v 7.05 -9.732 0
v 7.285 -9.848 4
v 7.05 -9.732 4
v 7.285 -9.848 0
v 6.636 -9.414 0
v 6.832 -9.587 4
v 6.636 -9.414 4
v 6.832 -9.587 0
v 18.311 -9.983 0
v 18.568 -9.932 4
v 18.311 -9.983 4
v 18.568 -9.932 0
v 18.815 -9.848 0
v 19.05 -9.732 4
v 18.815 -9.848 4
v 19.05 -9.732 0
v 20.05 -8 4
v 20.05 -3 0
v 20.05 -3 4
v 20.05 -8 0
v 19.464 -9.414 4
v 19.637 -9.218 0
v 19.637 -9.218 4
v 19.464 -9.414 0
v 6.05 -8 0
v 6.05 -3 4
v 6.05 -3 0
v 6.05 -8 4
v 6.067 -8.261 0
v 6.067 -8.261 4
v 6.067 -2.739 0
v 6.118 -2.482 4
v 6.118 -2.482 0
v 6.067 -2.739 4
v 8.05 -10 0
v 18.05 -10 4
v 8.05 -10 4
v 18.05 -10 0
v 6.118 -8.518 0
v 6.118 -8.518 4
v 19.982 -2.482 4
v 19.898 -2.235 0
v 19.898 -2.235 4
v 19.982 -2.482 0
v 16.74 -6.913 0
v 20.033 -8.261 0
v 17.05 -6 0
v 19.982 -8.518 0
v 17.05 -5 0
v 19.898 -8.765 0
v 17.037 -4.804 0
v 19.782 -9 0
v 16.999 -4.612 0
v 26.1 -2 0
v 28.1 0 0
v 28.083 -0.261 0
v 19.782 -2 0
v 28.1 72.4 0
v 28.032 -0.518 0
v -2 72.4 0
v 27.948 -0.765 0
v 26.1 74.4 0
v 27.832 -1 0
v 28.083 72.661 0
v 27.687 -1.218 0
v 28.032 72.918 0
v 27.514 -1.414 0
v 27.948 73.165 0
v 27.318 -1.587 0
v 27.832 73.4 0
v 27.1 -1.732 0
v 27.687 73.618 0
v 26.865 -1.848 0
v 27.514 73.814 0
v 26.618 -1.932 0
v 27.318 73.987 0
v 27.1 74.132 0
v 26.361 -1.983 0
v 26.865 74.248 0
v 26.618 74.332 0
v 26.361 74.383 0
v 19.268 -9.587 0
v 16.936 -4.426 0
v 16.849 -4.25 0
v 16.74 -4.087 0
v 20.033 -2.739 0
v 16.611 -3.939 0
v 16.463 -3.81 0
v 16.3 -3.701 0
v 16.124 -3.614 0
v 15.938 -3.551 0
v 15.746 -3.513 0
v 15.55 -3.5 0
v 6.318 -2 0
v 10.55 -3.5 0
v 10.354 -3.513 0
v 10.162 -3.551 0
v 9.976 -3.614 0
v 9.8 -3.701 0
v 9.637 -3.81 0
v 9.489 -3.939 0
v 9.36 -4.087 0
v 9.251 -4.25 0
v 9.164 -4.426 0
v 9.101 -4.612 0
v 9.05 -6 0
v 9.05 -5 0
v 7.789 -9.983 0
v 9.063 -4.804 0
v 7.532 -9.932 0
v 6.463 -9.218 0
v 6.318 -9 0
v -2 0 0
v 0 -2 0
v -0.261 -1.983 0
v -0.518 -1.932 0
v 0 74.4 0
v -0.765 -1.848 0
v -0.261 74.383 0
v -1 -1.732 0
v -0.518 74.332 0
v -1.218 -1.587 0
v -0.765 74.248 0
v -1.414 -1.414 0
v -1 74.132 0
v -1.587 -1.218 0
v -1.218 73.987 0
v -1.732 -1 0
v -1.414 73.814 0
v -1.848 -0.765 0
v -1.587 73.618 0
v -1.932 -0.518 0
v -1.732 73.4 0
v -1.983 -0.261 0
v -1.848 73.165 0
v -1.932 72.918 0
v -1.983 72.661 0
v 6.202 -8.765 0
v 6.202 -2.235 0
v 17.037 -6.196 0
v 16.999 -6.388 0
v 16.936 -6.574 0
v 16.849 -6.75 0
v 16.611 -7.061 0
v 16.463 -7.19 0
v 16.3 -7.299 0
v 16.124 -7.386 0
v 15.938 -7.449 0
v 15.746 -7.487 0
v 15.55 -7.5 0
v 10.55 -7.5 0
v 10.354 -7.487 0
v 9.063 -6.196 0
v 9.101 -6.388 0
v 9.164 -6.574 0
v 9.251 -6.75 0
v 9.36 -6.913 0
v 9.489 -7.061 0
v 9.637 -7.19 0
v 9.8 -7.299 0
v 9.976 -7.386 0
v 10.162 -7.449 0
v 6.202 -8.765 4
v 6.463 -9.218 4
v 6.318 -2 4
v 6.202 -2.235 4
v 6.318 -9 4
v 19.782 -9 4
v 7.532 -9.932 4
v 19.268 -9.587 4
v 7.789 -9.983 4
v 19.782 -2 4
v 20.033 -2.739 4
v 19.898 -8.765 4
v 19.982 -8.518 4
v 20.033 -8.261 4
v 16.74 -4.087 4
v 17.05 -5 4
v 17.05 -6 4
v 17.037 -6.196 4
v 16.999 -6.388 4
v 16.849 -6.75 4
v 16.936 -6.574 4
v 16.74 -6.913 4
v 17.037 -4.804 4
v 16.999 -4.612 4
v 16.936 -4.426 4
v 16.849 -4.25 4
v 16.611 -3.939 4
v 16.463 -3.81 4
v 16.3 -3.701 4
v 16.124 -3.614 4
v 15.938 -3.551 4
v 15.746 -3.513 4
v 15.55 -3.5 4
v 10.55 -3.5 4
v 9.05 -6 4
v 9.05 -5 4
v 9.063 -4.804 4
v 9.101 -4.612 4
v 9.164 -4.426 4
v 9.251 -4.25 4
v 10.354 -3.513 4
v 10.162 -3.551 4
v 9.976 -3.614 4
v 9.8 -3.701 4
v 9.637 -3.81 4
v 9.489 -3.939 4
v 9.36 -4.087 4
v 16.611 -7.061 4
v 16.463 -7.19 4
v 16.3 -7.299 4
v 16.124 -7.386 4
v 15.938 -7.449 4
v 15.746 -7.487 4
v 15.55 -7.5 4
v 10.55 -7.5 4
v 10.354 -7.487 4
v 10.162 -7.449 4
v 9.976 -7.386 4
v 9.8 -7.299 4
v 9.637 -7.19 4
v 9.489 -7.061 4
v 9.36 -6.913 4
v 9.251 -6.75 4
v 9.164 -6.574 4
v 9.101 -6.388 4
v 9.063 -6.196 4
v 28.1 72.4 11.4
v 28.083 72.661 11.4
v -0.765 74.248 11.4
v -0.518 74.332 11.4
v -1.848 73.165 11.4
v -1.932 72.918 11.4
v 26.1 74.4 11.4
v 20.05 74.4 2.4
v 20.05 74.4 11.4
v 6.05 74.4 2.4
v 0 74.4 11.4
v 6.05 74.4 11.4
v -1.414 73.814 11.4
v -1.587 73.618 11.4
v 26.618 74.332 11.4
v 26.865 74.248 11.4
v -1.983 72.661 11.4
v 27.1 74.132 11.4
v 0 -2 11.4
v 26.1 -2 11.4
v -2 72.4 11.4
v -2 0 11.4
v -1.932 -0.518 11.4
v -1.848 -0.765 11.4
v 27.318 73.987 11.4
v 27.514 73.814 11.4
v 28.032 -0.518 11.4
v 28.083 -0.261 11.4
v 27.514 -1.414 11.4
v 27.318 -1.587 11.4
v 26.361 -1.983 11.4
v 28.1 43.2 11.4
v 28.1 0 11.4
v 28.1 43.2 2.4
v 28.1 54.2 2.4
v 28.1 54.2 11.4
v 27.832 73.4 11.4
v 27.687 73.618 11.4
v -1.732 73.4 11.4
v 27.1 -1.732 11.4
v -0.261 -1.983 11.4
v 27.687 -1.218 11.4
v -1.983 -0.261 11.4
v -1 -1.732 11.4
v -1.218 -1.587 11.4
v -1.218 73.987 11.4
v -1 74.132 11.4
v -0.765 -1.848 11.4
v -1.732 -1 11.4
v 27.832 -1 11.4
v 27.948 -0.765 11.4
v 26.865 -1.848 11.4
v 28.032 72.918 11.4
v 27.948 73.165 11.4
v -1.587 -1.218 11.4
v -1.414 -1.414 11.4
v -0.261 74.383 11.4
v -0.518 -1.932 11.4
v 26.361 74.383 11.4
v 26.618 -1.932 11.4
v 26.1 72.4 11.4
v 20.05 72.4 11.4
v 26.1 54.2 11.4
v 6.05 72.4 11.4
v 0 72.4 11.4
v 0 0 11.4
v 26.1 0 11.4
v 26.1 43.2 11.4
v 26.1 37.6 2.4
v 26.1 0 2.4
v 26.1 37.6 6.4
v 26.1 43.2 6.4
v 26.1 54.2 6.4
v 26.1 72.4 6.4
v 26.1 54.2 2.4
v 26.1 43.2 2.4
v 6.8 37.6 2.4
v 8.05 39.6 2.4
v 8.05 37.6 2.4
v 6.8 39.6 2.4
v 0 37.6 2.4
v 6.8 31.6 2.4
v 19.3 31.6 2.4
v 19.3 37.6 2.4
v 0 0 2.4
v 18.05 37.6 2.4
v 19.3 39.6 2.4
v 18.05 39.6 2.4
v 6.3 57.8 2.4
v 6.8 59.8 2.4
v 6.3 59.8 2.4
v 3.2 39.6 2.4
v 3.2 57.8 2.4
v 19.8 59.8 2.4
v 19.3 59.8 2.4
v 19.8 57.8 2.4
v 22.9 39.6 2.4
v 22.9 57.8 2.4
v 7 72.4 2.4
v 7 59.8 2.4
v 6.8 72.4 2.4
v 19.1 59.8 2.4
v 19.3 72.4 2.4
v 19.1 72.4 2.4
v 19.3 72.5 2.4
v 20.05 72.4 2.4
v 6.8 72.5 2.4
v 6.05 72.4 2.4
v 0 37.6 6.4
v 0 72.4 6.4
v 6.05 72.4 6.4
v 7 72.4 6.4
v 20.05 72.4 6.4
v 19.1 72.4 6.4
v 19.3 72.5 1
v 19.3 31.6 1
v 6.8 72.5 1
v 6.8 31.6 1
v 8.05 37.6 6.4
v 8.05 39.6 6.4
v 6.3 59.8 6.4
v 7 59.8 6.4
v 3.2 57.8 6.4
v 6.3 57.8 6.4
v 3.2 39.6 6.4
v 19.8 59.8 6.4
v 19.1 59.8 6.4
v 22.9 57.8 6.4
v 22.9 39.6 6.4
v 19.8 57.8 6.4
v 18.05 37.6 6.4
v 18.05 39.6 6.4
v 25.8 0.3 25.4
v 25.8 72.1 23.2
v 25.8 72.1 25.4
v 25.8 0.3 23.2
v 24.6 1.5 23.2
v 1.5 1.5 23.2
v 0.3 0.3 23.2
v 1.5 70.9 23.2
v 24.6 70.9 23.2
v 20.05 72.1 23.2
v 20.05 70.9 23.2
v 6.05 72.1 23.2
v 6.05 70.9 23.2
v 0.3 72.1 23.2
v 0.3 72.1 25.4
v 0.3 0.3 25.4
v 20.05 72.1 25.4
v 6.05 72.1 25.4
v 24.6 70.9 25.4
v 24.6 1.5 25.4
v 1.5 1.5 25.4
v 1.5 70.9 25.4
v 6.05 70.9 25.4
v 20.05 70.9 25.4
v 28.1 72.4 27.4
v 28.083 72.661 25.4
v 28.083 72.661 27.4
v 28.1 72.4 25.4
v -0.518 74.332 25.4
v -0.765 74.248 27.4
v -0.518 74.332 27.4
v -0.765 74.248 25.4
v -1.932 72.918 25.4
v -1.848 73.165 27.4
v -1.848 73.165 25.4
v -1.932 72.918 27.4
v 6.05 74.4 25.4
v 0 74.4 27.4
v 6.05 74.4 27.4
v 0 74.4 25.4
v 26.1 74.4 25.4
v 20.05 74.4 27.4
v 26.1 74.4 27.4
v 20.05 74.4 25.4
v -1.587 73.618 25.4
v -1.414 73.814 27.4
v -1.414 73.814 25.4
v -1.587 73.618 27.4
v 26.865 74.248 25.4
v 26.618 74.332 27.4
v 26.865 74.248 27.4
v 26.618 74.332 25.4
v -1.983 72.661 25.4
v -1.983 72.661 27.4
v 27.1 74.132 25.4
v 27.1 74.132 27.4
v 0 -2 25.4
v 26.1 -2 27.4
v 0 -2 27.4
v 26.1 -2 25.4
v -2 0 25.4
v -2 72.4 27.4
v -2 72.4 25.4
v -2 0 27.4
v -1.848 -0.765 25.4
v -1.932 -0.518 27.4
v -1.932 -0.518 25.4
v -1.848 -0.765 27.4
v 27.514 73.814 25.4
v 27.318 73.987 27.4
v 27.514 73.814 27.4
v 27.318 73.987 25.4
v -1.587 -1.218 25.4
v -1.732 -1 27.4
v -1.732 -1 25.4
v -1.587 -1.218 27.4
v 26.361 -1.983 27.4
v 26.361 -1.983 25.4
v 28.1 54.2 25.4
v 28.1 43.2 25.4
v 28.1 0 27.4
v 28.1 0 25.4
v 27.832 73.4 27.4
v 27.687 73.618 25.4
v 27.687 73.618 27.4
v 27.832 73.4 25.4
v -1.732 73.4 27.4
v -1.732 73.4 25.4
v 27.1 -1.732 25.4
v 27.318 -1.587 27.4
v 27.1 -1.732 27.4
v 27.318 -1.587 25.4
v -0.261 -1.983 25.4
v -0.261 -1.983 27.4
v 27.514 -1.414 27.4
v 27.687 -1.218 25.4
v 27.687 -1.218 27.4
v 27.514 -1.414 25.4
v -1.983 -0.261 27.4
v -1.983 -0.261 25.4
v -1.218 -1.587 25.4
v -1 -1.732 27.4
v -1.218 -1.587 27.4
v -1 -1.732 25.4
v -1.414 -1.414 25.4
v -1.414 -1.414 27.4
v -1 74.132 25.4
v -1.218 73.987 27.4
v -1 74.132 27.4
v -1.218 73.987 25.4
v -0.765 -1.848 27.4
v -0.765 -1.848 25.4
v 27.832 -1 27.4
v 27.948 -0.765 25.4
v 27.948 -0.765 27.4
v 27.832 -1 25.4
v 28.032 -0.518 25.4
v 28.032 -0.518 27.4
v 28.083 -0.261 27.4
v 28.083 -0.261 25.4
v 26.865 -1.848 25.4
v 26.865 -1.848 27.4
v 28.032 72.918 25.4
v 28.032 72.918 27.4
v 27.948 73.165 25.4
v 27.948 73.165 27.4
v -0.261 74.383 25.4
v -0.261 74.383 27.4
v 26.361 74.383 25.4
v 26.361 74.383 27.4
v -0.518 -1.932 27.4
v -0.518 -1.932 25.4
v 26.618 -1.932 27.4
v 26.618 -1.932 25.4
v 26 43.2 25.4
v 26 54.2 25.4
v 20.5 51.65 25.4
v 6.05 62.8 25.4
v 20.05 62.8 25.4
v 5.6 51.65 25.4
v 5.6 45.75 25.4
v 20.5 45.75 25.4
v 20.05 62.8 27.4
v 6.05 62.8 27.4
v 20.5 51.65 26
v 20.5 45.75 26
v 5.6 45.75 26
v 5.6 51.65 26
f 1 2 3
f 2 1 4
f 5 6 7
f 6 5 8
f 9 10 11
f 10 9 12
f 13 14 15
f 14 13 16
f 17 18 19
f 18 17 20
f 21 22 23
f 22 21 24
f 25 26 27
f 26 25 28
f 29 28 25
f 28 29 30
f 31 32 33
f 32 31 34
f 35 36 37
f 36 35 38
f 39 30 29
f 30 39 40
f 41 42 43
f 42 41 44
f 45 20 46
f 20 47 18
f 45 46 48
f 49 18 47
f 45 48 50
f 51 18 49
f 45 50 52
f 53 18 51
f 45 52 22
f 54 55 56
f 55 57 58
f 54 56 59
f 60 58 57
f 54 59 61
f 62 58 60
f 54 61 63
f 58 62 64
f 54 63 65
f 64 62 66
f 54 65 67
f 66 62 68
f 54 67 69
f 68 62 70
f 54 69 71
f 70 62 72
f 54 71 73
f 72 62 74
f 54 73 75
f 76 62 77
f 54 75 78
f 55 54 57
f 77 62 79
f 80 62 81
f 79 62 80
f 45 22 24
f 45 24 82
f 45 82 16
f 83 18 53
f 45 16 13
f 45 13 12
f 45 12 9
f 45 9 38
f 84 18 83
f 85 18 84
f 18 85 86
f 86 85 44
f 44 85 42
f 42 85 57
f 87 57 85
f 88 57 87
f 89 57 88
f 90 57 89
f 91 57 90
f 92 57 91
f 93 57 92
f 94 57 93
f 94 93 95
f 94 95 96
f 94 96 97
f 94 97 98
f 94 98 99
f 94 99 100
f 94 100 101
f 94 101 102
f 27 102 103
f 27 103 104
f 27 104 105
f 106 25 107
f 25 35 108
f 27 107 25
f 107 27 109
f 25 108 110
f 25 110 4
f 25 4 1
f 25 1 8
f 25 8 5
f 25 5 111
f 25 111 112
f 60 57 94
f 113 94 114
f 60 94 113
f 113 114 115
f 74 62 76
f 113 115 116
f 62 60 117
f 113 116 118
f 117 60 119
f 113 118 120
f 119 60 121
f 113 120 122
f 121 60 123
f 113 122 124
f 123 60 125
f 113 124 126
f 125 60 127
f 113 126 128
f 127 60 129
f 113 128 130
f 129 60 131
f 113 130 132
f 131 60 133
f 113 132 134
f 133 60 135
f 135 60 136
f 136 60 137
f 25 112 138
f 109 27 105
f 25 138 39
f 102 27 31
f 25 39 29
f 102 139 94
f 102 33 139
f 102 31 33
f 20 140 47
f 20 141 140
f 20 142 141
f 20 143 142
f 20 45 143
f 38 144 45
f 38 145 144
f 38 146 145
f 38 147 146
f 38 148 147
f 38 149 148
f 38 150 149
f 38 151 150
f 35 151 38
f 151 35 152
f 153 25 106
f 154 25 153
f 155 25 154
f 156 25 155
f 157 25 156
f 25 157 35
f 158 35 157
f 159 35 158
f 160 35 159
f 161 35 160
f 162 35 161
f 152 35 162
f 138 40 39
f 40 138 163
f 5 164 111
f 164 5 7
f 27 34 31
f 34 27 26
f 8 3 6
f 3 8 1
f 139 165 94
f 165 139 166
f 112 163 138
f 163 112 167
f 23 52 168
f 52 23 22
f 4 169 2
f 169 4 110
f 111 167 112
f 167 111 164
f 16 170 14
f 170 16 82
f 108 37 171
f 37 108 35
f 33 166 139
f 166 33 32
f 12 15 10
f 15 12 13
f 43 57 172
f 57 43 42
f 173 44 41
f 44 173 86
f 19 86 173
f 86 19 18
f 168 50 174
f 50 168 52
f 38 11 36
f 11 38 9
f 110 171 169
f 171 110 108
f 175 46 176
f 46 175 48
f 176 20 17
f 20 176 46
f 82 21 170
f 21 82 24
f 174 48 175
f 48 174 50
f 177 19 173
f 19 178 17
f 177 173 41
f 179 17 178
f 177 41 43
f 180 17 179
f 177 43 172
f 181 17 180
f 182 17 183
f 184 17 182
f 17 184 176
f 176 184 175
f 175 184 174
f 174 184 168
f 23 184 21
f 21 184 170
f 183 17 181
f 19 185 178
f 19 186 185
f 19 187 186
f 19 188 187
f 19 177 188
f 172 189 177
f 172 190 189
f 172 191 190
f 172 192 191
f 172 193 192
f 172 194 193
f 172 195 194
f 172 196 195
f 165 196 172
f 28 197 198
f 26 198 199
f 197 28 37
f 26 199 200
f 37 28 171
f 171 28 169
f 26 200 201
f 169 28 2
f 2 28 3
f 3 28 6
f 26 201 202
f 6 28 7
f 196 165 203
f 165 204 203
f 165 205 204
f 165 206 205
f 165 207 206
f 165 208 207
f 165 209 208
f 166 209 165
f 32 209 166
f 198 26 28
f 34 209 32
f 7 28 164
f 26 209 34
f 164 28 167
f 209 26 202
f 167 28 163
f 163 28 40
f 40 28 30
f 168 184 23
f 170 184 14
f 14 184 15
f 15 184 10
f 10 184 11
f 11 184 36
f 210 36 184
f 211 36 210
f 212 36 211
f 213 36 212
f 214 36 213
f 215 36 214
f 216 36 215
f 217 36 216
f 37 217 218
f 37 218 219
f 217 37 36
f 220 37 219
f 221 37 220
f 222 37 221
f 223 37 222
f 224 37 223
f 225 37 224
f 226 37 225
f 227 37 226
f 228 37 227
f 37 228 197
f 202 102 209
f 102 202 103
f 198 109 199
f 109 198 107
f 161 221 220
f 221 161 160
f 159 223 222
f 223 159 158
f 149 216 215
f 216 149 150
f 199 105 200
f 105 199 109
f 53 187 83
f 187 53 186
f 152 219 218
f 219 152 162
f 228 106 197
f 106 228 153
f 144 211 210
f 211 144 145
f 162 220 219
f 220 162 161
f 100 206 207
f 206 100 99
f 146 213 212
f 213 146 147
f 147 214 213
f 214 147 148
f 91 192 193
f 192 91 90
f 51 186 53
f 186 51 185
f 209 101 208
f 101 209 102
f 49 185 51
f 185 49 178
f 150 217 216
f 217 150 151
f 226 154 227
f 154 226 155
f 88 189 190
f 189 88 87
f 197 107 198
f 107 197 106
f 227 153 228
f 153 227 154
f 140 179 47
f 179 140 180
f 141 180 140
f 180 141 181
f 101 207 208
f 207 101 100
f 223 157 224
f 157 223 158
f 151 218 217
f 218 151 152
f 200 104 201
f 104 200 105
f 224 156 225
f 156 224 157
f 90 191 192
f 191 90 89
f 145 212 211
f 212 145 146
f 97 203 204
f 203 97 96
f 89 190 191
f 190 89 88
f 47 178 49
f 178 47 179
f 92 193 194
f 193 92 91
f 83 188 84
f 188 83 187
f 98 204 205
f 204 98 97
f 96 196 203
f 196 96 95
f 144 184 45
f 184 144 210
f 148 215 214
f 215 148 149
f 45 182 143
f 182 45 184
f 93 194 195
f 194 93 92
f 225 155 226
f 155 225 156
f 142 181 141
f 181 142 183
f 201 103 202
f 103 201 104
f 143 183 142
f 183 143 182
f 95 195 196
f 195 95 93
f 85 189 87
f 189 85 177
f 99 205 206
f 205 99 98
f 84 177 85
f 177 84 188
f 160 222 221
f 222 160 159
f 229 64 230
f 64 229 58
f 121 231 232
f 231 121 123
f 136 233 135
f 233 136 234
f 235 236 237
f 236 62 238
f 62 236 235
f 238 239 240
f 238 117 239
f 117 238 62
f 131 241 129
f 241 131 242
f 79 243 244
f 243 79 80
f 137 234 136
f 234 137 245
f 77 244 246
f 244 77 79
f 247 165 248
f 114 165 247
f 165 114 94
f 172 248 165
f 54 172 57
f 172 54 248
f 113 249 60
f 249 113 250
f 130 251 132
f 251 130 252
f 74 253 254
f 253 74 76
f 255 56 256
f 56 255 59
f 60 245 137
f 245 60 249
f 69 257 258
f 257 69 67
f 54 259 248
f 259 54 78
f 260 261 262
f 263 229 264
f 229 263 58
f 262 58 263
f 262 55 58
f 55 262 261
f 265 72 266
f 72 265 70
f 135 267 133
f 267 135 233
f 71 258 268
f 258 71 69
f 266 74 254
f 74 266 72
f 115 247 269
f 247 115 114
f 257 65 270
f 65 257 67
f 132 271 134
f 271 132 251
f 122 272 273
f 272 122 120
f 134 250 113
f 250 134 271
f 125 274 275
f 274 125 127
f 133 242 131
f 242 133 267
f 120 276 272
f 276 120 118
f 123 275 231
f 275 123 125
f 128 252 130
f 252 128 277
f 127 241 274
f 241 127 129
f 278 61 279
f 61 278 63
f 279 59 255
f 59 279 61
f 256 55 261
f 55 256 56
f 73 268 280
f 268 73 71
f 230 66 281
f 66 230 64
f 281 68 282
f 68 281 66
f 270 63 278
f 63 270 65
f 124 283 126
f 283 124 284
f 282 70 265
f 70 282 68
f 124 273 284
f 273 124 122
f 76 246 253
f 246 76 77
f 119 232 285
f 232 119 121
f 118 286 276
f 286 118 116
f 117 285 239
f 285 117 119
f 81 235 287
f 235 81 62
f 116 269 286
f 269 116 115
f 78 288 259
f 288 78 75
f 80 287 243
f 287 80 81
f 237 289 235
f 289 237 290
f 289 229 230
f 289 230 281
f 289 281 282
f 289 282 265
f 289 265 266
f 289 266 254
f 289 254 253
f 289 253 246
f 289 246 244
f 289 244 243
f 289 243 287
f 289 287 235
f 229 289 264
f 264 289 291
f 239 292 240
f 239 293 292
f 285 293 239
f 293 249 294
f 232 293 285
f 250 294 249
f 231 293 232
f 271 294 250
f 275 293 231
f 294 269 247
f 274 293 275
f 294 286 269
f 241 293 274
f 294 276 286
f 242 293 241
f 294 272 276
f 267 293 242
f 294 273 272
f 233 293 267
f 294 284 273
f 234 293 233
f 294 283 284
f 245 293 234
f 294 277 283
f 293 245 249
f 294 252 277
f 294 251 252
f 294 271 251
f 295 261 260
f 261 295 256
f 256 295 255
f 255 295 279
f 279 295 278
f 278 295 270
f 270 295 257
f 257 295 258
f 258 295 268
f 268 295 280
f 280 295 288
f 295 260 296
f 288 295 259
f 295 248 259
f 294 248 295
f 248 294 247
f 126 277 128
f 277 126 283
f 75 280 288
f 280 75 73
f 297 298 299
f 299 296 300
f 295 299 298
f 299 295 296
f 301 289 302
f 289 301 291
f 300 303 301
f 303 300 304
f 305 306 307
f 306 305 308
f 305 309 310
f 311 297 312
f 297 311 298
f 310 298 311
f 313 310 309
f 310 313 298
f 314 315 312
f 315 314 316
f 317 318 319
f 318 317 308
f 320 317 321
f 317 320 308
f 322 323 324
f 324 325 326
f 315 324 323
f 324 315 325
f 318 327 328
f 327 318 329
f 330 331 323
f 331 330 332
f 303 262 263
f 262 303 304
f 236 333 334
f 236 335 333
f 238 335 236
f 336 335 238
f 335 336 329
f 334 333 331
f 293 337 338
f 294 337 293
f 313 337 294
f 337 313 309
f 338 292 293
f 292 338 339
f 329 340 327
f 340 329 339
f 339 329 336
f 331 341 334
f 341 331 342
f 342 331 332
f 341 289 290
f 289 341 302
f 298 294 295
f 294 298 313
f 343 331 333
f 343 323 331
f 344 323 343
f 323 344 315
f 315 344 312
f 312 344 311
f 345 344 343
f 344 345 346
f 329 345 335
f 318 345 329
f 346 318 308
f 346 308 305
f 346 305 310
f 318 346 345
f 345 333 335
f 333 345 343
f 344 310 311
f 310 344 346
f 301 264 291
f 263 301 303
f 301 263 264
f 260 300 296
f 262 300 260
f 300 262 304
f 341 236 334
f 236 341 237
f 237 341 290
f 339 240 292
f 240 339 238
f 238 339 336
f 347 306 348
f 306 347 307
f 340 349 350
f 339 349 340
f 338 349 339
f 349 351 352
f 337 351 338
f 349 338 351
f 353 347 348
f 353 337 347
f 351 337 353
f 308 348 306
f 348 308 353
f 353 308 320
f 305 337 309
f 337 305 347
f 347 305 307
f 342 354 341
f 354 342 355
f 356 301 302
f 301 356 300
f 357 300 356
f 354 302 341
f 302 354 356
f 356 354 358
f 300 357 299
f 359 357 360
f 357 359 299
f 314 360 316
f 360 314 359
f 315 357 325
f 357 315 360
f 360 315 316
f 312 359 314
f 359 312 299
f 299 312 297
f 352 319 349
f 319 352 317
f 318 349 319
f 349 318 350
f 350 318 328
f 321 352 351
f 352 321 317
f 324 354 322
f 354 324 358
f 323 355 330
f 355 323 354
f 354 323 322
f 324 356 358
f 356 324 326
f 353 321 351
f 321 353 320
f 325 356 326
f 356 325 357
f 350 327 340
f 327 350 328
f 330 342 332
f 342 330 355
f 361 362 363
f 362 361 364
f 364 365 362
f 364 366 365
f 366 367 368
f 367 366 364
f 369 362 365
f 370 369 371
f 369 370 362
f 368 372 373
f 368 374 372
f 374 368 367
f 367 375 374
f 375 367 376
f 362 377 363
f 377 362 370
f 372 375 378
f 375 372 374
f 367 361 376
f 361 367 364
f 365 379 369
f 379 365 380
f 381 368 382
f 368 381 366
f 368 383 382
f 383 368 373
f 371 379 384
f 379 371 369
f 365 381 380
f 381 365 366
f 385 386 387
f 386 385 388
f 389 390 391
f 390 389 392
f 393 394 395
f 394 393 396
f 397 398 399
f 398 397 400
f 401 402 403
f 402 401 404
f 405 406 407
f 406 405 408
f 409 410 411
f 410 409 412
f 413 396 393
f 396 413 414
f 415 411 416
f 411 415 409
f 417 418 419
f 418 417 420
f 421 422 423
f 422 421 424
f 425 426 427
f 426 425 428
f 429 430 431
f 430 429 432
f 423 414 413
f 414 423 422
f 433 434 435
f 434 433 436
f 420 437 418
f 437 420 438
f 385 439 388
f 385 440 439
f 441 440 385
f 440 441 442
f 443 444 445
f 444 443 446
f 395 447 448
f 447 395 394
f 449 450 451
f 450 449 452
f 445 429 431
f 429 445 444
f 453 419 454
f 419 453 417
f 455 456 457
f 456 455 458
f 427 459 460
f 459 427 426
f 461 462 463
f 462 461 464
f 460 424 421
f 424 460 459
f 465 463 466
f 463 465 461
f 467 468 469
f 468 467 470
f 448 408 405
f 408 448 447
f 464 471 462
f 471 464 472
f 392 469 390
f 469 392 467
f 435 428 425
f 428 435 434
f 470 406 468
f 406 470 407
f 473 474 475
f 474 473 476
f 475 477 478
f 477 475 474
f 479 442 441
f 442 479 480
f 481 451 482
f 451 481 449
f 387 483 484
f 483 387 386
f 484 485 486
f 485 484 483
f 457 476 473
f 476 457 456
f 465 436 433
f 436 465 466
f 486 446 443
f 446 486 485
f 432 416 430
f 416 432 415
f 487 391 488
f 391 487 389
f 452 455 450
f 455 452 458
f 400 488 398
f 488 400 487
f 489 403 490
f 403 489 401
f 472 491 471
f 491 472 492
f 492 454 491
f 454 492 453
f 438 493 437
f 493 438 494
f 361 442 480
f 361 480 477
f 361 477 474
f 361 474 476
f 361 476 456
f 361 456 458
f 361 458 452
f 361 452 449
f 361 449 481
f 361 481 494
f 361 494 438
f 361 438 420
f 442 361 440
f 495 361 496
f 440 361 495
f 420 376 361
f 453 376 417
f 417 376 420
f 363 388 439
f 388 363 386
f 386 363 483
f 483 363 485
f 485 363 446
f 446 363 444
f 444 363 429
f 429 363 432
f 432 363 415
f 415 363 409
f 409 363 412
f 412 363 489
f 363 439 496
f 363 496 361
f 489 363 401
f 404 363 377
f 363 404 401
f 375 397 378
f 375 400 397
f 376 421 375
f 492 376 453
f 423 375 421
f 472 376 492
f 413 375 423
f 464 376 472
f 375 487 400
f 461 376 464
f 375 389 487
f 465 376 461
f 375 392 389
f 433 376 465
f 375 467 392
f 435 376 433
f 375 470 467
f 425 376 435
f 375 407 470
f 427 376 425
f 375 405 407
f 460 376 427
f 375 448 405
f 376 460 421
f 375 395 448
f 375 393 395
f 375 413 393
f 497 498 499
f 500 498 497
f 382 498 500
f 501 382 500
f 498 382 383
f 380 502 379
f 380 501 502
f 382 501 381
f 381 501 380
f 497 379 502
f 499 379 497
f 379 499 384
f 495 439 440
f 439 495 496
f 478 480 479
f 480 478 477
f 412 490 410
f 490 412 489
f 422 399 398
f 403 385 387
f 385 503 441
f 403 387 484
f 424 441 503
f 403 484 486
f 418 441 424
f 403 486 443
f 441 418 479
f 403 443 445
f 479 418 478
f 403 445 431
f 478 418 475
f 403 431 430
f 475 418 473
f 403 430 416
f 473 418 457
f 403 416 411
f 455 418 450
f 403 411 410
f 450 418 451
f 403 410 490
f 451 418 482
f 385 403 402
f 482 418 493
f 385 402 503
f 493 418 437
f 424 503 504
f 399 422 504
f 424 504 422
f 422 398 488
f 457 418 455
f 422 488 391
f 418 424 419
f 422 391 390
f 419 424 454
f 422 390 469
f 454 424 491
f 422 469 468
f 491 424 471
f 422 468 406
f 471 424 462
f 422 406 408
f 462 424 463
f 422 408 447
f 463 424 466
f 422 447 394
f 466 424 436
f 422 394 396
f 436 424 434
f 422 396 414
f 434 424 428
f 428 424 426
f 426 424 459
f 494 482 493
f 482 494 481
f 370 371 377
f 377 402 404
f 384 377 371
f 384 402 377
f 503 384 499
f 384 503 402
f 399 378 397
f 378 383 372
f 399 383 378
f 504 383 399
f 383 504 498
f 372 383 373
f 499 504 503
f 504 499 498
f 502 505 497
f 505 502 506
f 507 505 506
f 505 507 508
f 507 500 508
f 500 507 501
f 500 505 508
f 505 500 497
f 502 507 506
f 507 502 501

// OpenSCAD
// file: common.scad
// 共通パラメータ: M5Stamp C5 / M5Stamp UWB F の公称寸法(mm)
// 出典: shop.m5stack.com 製品ページ(2026-08 時点)
//   M5Stamp C5:     17.6 x 19.1 x 3.4 mm
//   M5Stamp UWB F:  11.5 x 12.0 x 2.8 mm(PCB アンテナ内蔵・背面 FPC コネクタ)
// 注意: 公称値ベースの v1 モデル。印刷後に実機でフィット確認し、tol を調整すること。
// C5 は DIP 版付属のピンヘッダをはんだ付けしない前提(付けると厚みが増して収まらない)。

c5_w = 17.6;   // C5 幅
c5_l = 19.1;   // C5 長さ(USB-C は短辺側と想定)
c5_t = 3.4;    // C5 厚み

uwb_w = 11.5;  // UWB F 幅
uwb_l = 12.0;  // UWB F 長さ(片端がアンテナ部)
uwb_t = 2.8;   // UWB F 厚み

// C5 同梱の Wi-Fi 用 FPC アンテナ(2.4/5 GHz、IPEX-1、ケーブル長 50 mm)
// 出典: docs.m5stack.com/en/core/Stamp-C5
wifi_ant_w = 14.3;  // 長さ
wifi_ant_h = 5.3;   // 幅

tol = 0.3;     // 片側クリアランス(ポケット寸法 = 部品寸法 + 2*tol)

fpc_w = 12.5;  // FPC ケーブル幅(0.5mm-12P + 余裕)

$fn = 48;

// ざぐり付きネジ穴(皿ネジ M3 想定)。h = 板厚
module screw_hole(h, d = 3.6, head_d = 7, head_h = 2) {
    translate([0, 0, -0.1]) cylinder(d = d, h = h + 0.2);
    translate([0, 0, h - head_h]) cylinder(d1 = d, d2 = head_d, h = head_h + 0.1);
}
// main file
// タグ用ケース(本体 + 摩擦嵌合フタの 2 部品)
// 内部レイアウト(長手方向): LiPo バッテリー | M5Stamp C5 | Stamp UWB F
// - UWB F のアンテナ端はケース端の開口(アンテナ窓)に向き、樹脂で覆わない
// - C5 の USB-C は側壁のスロットから充電・書き込み可能
// - C5 の Wi-Fi 用 FPC アンテナはフタ裏の凹み(C5 ゾーン上)に貼る。UWB アンテナ・LiPo から離す
// - 各ボードは背面 FPC コネクタが床の溝に収まる向き(部品面を上)で置く
// - バッテリー端には ストラップループ
// 印刷: 本体は底面、フタは天面をベッドに向ける(どちらもサポート不要)
// part = "body" | "lid" | "preview"(本体 + 浮かせたフタ)

include <common.scad>

part = "preview";

bat = [25.5, 37, 5.2];  // LiPo 公称 [幅, 長さ, 厚み](例: DPTL-DTP502535 400 mAh)。要実測調整

wall = 2;       // 側壁厚
floor_t = 2.4;  // 底厚
cavity_d = 9;   // 内寸深さ
rib = 2;        // 仕切り壁厚
rail_h = 4;     // 仕切り・レール高さ
chan_d = 1.4;   // 床の FPC/配線溝の深さ
lid_t = 2;      // フタ厚
skirt_h = 2.2;  // フタのスカート(嵌合部)高さ
win_w = 14;     // アンテナ窓の幅
ant_d = 0.6;    // フタ裏の Wi-Fi アンテナ用凹みの深さ

iw = bat[0] + 2 * tol;                  // 内寸幅(バッテリー幅で決まる)
bat_l  = bat[1] + 2 * tol;
c5_zone  = c5_w + 2 * tol;              // C5 は長辺(19.1)を幅方向に置く → USB-C が側壁を向く
uwb_zone = uwb_l + 2 * tol;
il = bat_l + rib + c5_zone + rib + uwb_zone;  // 内寸長さ
ol = il + 2 * wall;
ow = iw + 2 * wall;
oh = floor_t + cavity_d;

c5_y0  = bat_l + rib;                   // C5 ゾーン開始 y(内寸座標)
uwb_y0 = c5_y0 + c5_zone + rib;

module rounded_box(size, r = 2) {
    hull() for (x = [r, size[0] - r], y = [r, size[1] - r])
        translate([x, y, 0]) cylinder(r = r, h = size[2]);
}

// 原点: 内寸の左下(x は中央揃えでなく壁内側)。外形は [-wall, -wall] から
module body() {
    difference() {
        union() {
            translate([-wall, -wall, 0]) rounded_box([ow, ol, oh]);
            // ストラップループ(バッテリー端の外側)
            translate([iw / 2 - 7, -wall - 8, 0]) loop_bar();
        }
        // キャビティ
        translate([0, 0, floor_t]) cube([iw, il, cavity_d + 0.1]);
        // 床の FPC/配線溝(C5 ゾーン中央から UWB 端まで)
        translate([iw / 2 - fpc_w / 2, c5_y0 - rib - 6, floor_t - chan_d])
            cube([fpc_w, il - (c5_y0 - rib - 6) + 0.1, chan_d + 0.1]);
        // USB-C スロット(+x 側壁、C5 ゾーン)
        translate([iw - 0.1, c5_y0 + (c5_zone - 11) / 2, floor_t])
            cube([wall + 0.2, 11, cavity_d + 0.1]);
        // アンテナ窓(UWB 端の壁を全高で開口)
        translate([iw / 2 - win_w / 2, il - 0.1, floor_t])
            cube([win_w, wall + 0.2, cavity_d + 0.1]);
    }
    // 仕切り(側方スタブのみ。中央はバッテリー配線 / FPC の通り道)
    divider(bat_l, gap = 10);
    divider(c5_y0 + c5_zone, gap = fpc_w + 1);
    // C5 センタリングレール(内寸幅 26.1 → C5 ポケット 19.7)
    rails(c5_y0, c5_zone, (iw - (c5_l + 2 * tol)) / 2);
    // UWB センタリングレール(→ ポケット 12.1)
    rails(uwb_y0, uwb_zone, (iw - (uwb_w + 2 * tol)) / 2);
}

module divider(y0, gap) {
    for (sx = [0, 1])
        translate([sx == 0 ? 0 : iw / 2 + gap / 2, y0, floor_t])
            cube([iw / 2 - gap / 2, rib, rail_h]);
}

module rails(y0, len, w) {
    for (sx = [0, 1])
        translate([sx == 0 ? 0 : iw - w, y0, floor_t])
            cube([w, len, rail_h]);
}

module loop_bar() {
    difference() {
        rounded_box([14, 9, 4], r = 2);
        translate([3, 2.5, -0.1]) rounded_box([8, 4, 4.2], r = 1.5);
    }
}

module lid() {
    difference() {
        union() {
            translate([-wall, -wall, oh]) rounded_box([ow, ol, lid_t]);
            // スカート(キャビティに摩擦嵌合)
            translate([0, 0, oh - skirt_h]) difference() {
                translate([tol, tol, 0]) cube([iw - 2 * tol, il - 2 * tol, skirt_h]);
                translate([tol + 1.2, tol + 1.2, -0.1]) cube([iw - 2 * tol - 2.4, il - 2 * tol - 2.4, skirt_h + 0.2]);
            }
        }
        // アンテナ窓(UWB アンテナ上面を開放。端の壁開口とつながる)
        translate([iw / 2 - win_w / 2, uwb_y0 + 3, oh - skirt_h - 0.1])
            cube([win_w, il - (uwb_y0 + 3) + wall + 0.1, skirt_h + lid_t + 0.2]);
        // Wi-Fi アンテナ用の凹み(フタ裏、C5 ゾーンの真上。長辺を幅方向に置く)
        translate([(iw - (wifi_ant_w + 2 * tol)) / 2,
                   c5_y0 + (c5_zone - (wifi_ant_h + 2 * tol)) / 2, oh - 0.1])
            cube([wifi_ant_w + 2 * tol, wifi_ant_h + 2 * tol, ant_d + 0.1]);
        // USB スロット上の逃げ(フタを閉めたままケーブルを挿せる)
        translate([iw - 0.1, c5_y0 + (c5_zone - 11) / 2, oh - skirt_h - 0.1])
            cube([wall + 0.2, 11, skirt_h + 0.1]);
    }
}

if (part == "body") body();
else if (part == "lid") lid();
else {
    body();
    translate([0, 0, 14]) lid();
}
